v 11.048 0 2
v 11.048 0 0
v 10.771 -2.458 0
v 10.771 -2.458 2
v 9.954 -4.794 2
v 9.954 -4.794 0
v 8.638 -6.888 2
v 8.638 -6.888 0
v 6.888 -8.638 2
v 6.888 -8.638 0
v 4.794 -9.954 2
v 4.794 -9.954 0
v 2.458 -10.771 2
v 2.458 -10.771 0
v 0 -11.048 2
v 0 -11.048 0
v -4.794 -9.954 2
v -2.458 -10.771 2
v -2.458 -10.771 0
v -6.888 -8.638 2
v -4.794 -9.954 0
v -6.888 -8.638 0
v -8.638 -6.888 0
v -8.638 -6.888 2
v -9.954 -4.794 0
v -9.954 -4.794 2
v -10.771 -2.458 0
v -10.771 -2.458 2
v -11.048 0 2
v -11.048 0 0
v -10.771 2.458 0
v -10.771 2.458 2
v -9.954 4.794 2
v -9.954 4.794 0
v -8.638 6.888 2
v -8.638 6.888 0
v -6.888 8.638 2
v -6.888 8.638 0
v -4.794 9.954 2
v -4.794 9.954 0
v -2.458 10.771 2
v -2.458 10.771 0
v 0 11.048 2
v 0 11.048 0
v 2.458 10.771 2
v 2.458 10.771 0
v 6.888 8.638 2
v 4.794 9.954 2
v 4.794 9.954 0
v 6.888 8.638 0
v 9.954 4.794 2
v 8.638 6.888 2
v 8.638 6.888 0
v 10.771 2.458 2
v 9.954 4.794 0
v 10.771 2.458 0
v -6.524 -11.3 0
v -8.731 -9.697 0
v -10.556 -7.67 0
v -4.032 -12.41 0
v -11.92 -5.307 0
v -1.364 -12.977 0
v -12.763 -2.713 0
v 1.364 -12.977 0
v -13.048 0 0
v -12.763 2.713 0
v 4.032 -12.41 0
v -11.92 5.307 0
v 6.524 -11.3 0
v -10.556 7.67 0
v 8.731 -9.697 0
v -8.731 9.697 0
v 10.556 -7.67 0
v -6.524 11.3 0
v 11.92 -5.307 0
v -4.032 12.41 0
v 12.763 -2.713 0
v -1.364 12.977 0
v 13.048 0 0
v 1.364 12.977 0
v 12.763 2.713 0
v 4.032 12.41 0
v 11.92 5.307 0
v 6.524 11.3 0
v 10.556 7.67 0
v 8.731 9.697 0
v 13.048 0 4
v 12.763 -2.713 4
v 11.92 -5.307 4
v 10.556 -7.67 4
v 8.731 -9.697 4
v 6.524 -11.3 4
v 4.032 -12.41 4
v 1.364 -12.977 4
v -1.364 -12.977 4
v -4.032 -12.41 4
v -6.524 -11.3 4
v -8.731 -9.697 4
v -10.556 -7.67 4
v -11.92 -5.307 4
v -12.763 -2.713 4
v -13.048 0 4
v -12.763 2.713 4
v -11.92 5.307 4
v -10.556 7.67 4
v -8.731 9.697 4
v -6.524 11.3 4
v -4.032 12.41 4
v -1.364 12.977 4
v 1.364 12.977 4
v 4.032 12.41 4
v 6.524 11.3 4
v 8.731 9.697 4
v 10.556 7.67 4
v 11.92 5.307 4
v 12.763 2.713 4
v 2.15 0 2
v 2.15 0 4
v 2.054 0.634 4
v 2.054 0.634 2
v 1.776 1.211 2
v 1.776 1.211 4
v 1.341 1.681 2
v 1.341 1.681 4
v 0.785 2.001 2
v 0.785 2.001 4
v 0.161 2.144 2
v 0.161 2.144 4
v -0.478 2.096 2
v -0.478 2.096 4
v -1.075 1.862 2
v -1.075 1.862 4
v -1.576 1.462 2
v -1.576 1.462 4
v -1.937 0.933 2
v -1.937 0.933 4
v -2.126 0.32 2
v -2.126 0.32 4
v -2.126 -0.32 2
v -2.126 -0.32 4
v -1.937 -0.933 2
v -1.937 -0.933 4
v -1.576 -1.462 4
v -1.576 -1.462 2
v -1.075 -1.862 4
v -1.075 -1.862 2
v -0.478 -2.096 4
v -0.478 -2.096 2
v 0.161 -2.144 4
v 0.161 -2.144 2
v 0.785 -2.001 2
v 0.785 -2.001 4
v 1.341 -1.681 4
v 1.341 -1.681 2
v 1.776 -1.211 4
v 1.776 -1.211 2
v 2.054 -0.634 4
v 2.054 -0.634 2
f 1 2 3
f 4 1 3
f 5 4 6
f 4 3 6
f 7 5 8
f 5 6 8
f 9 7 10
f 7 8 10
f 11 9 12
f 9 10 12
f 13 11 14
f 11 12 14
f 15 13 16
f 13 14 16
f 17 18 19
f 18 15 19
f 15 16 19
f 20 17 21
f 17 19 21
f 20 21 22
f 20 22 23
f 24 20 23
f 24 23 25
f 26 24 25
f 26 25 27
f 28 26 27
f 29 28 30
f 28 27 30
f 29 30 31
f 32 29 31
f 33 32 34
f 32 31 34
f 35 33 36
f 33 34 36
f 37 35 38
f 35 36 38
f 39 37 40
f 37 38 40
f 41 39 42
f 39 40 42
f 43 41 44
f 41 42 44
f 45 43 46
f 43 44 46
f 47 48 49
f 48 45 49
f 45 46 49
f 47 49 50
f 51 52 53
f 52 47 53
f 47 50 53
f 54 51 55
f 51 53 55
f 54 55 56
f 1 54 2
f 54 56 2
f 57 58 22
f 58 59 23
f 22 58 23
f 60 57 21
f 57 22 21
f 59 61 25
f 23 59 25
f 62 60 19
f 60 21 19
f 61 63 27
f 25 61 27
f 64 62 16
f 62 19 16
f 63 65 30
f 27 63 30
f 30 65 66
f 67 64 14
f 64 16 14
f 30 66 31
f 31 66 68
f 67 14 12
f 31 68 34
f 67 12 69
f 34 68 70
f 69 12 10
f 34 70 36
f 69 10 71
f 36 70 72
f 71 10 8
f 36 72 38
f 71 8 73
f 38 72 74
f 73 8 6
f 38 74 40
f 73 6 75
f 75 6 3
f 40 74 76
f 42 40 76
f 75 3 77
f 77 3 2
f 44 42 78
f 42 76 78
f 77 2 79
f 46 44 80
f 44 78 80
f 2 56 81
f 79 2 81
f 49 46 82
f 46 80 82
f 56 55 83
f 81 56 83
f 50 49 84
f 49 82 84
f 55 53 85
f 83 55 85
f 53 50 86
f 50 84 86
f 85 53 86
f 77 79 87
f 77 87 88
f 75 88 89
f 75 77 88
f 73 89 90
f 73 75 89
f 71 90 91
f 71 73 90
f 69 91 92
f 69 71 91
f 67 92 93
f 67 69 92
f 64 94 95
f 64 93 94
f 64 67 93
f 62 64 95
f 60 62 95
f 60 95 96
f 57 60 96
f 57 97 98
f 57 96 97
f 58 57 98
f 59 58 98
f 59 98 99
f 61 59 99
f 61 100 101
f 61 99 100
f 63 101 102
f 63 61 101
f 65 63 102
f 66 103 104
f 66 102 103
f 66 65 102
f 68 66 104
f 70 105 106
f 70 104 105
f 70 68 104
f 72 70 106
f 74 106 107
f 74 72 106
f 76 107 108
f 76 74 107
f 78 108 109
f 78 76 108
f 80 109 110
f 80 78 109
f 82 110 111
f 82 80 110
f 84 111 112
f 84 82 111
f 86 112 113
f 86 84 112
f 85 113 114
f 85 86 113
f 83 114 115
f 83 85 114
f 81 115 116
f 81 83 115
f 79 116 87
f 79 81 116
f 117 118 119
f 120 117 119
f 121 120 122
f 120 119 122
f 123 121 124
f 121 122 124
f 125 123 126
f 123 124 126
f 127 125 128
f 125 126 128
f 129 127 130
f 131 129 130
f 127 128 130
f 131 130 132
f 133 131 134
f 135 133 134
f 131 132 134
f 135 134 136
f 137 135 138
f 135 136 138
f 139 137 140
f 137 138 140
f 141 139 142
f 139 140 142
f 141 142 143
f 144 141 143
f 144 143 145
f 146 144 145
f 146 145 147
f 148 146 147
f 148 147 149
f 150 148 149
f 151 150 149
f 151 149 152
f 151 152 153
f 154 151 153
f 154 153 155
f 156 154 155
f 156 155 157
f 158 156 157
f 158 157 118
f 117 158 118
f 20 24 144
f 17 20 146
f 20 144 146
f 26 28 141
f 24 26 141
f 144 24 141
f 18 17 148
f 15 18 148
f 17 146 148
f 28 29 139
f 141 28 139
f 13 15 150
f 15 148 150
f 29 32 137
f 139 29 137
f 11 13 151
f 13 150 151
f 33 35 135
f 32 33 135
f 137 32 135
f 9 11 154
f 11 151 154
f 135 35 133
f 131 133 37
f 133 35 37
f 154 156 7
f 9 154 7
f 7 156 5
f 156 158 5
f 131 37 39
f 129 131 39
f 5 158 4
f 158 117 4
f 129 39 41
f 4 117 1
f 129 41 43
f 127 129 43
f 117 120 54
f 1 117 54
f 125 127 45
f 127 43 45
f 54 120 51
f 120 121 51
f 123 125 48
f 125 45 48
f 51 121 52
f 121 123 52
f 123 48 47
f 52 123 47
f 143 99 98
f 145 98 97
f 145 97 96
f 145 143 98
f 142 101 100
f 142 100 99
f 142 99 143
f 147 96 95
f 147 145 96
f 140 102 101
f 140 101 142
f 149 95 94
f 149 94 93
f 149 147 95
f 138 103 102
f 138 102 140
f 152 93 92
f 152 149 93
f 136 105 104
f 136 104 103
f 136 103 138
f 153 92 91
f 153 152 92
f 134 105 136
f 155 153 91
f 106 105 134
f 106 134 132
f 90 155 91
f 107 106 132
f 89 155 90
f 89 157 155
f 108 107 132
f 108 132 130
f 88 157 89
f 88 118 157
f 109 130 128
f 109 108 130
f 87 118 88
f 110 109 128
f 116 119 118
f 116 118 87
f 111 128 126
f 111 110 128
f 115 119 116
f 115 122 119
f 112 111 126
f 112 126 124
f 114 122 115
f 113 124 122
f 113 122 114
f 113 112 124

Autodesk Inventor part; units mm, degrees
ref_plane "YZ Plane" through (0, 0, 0) normal (1, 0, 0) x (0, 1, 0)
ref_plane "XZ Plane" through (0, 0, 0) normal (0, 1, 0) x (-1, 0, 0)
ref_plane "XY Plane" through (0, 0, 0) normal (0, 0, 1) x (1, 0, 0)
sketch "Sketch1" plane through (0, 0, 0) normal (0, 0, 1) x (1, 0, 0)
  circle A0 centre (0, 0) radius 13.0482 projected
  circle A1 centre (0, 0) radius 12.0482 projected
  circle A2 centre (0, 0) radius 11.0482 projected
  point P0 (0, 0)
extrude "Extrusion1" add sketch "Sketch1" along normal blind 2 contours A0 | A1
sketch "Sketch2" plane through (0, 0, 2) normal (0, 0, 1) x (1, 0, 0)
  circle A0 centre (0, 0) radius 13.0482 projected
  circle A1 centre (0, 0) radius 13.0482
extrude "Extrusion2" add sketch "Sketch2" along normal blind 2
sketch "Sketch3" plane through (0, 0, 4) normal (0, 0, 1) x (1, 0, 0)
  circle A0 centre (0, 0) radius 13.0482 projected
  circle A1 centre (0, 0) radius 2.15
  dimension "d4" = 4.3
extrude "Extrusion3" cut sketch "Sketch3" against normal through all contours A1
properties part number "EndCap"
